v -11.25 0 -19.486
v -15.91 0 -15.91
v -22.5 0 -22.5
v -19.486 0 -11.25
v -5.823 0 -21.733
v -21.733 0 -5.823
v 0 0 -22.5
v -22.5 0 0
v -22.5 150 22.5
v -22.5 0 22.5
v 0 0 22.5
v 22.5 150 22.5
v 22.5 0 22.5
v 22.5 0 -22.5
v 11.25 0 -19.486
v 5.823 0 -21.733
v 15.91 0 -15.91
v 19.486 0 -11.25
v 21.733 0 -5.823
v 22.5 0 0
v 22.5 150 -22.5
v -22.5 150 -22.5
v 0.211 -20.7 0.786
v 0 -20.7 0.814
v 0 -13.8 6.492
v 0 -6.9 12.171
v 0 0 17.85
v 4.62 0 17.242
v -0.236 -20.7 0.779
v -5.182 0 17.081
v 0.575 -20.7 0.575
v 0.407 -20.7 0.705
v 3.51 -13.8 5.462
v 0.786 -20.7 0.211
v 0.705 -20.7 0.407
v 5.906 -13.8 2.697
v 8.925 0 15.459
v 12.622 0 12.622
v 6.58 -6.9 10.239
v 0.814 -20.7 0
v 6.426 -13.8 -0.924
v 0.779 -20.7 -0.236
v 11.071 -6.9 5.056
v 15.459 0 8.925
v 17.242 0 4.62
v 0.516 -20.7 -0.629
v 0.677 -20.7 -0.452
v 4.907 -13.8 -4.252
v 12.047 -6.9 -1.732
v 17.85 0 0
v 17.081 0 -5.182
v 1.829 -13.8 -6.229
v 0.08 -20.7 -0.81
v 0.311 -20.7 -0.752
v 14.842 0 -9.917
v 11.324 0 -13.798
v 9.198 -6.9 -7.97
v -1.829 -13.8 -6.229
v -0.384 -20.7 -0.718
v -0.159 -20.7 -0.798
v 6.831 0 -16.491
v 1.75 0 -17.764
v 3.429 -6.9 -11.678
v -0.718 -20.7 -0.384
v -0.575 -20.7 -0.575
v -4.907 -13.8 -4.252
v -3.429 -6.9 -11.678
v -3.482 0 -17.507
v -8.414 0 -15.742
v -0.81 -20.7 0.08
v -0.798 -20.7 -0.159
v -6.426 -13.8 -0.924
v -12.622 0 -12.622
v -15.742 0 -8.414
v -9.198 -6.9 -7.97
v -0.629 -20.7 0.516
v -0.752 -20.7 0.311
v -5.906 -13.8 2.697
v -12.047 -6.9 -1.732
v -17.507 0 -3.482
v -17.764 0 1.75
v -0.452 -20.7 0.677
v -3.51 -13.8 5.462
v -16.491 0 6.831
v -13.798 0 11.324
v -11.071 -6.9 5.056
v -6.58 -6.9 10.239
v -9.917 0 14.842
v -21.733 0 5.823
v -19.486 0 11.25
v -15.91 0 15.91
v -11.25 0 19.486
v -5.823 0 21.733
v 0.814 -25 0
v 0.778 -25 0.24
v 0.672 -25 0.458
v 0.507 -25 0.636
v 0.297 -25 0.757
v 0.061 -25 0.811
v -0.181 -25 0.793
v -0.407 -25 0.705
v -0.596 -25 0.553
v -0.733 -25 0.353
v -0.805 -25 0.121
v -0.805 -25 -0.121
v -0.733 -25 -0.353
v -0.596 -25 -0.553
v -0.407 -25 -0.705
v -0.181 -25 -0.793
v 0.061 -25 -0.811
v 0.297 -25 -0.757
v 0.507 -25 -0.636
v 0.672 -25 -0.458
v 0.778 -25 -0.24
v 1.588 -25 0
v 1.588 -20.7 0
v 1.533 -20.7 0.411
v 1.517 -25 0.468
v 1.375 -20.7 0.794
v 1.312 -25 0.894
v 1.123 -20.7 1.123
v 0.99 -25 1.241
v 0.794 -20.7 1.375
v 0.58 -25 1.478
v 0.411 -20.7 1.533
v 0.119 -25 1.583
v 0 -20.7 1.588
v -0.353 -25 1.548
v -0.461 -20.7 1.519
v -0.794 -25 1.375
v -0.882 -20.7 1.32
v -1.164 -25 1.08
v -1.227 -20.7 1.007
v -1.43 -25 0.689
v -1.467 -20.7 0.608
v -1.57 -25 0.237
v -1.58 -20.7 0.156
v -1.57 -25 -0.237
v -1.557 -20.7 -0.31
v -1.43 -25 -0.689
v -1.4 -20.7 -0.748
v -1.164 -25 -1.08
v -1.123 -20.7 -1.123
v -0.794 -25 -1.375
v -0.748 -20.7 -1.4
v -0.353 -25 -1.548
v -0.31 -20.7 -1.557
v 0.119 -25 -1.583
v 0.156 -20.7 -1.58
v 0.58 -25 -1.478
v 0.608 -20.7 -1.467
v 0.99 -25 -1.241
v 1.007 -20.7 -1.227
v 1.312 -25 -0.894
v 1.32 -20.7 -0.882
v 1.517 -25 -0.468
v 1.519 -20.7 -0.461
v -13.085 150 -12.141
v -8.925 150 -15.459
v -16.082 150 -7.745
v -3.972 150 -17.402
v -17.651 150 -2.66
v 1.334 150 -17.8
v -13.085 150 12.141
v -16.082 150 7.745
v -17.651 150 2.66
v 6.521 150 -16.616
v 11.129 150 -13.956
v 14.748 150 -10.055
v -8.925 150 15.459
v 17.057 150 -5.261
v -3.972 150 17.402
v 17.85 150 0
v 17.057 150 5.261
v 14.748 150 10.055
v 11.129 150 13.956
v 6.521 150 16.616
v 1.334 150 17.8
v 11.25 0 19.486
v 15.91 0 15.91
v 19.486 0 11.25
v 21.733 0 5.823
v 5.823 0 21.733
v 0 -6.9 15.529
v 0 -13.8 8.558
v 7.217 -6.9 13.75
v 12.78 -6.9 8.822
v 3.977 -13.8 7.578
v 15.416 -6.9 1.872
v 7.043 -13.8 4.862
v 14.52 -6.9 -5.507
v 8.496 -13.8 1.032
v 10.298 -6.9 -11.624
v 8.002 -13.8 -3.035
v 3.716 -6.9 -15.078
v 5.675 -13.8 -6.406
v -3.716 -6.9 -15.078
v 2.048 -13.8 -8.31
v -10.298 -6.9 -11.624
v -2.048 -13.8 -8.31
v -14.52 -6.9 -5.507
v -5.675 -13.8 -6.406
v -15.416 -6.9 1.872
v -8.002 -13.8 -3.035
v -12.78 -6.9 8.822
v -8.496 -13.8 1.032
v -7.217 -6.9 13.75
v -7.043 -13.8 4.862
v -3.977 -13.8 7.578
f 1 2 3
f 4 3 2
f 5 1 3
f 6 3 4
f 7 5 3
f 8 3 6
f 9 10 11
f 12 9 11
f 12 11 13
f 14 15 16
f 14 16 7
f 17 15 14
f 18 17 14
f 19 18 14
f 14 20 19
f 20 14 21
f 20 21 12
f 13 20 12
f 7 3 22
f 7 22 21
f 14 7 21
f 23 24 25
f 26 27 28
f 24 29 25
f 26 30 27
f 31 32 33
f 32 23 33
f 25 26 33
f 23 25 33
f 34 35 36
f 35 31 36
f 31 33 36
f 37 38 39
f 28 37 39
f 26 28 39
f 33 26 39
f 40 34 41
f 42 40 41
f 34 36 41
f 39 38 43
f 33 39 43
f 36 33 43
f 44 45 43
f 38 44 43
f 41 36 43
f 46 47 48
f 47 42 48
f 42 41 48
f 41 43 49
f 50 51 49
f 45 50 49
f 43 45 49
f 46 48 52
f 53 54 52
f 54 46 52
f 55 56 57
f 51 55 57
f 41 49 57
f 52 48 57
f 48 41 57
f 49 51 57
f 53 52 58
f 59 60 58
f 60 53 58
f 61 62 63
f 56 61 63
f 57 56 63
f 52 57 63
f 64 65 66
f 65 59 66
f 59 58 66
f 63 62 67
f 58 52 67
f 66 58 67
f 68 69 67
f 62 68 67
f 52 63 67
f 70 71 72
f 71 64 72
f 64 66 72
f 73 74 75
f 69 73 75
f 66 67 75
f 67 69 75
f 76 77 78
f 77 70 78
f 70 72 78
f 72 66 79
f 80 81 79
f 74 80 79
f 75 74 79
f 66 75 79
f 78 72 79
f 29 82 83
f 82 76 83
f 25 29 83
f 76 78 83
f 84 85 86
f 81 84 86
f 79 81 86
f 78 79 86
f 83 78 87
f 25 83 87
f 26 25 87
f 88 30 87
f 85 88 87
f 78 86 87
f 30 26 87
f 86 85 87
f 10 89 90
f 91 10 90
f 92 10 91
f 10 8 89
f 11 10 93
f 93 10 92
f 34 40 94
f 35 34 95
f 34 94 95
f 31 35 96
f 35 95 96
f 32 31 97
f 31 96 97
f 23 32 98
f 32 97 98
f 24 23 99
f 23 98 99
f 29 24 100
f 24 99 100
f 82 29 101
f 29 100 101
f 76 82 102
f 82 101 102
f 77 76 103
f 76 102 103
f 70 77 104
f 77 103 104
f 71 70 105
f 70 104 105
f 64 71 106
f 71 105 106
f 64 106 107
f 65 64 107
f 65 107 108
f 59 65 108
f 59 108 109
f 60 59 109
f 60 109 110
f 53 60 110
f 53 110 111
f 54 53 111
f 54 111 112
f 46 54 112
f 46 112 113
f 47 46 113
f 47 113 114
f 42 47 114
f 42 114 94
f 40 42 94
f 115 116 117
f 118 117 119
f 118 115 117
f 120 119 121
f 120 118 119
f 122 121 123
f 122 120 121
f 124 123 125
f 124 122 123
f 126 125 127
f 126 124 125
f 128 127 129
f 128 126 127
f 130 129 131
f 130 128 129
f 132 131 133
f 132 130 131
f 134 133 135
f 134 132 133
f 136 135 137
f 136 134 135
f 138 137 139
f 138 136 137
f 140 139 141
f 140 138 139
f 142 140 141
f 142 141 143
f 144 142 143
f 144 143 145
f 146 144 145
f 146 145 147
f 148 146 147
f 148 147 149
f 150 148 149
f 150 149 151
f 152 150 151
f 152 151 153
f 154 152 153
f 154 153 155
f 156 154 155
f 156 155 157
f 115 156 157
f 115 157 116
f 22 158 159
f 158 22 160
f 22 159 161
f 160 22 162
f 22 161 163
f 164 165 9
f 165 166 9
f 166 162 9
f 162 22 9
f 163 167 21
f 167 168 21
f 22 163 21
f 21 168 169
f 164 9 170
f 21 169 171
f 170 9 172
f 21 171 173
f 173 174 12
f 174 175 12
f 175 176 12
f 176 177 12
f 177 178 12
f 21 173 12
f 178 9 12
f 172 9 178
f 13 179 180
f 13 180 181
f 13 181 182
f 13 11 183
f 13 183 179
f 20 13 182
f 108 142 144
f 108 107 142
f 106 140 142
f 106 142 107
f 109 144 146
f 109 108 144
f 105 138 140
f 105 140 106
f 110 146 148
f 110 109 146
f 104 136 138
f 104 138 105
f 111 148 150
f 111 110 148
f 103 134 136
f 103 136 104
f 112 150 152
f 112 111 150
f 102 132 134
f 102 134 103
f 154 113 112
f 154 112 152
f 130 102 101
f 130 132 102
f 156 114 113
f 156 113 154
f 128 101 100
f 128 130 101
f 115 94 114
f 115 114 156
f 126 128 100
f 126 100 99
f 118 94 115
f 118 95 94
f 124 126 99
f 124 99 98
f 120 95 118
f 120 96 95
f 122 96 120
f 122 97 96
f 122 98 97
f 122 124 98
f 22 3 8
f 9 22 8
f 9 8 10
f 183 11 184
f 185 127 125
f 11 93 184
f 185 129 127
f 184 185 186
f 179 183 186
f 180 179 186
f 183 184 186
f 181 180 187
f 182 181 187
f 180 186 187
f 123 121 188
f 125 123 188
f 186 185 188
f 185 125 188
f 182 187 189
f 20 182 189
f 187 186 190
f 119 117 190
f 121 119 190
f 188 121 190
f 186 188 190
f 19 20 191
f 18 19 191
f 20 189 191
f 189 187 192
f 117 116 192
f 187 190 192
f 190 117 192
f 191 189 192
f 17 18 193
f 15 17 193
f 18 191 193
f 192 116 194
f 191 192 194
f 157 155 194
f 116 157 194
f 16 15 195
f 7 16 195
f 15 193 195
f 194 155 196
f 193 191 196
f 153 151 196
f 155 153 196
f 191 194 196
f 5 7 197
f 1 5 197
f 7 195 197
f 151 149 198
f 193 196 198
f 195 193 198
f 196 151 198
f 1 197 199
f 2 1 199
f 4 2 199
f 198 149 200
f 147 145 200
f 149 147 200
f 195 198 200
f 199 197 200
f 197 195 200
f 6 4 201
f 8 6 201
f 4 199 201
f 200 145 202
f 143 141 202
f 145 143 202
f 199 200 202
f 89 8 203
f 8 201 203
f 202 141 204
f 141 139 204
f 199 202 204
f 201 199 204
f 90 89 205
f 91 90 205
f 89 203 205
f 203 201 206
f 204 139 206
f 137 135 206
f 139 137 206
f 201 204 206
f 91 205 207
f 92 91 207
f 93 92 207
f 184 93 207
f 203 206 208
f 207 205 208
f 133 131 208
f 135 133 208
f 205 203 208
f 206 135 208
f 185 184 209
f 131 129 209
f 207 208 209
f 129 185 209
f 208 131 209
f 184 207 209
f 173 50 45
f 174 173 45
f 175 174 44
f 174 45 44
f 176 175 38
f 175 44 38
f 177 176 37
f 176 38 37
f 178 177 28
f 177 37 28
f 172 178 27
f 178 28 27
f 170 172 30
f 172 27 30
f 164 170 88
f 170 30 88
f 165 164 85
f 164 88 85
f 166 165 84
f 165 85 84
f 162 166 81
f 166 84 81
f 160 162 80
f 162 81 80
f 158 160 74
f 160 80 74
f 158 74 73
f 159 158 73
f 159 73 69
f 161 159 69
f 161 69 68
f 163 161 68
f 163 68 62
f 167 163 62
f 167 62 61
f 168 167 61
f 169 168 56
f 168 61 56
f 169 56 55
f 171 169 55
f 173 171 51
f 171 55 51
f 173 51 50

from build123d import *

# Parameters (mm, degrees)
F0_W     = 45
F0_H     = 45
F0_R     = 17.85
F1_DEPTH = 150
F3_R     = 1.5875
F3_R_2   = 0.813681
F4_DEPTH = 4.3


with BuildPart() as f1:
    # F0 (on Front) → F1 (new body)
    with BuildSketch(Plane.XZ):
        Rectangle(F0_W, F0_H)
        Circle(F0_R, mode=Mode.SUBTRACT)
    extrude(amount=-F1_DEPTH)



with BuildPart() as f4:
    # F3 (on offset) → F4 (new body)
    with BuildSketch(Plane.XZ.offset(25)):
        Circle(F3_R)
        Circle(F3_R_2, mode=Mode.SUBTRACT)
    extrude(amount=-F4_DEPTH)


with BuildPart() as f1_1:
    add(f1.part)

    add(f4.part)  # F6 merges F4
    # F5 (on Right) → F6 (revolve)
    with BuildSketch(Plane.YZ):
        Polygon((-20.7, 0.813681), (0, 17.85), (0, 22.5), (-20.7, 1.5875), align=None)
    revolve(axis=Axis((0, 22.813175, 0), (0, 1, 0)))


solid = f1_1.part
